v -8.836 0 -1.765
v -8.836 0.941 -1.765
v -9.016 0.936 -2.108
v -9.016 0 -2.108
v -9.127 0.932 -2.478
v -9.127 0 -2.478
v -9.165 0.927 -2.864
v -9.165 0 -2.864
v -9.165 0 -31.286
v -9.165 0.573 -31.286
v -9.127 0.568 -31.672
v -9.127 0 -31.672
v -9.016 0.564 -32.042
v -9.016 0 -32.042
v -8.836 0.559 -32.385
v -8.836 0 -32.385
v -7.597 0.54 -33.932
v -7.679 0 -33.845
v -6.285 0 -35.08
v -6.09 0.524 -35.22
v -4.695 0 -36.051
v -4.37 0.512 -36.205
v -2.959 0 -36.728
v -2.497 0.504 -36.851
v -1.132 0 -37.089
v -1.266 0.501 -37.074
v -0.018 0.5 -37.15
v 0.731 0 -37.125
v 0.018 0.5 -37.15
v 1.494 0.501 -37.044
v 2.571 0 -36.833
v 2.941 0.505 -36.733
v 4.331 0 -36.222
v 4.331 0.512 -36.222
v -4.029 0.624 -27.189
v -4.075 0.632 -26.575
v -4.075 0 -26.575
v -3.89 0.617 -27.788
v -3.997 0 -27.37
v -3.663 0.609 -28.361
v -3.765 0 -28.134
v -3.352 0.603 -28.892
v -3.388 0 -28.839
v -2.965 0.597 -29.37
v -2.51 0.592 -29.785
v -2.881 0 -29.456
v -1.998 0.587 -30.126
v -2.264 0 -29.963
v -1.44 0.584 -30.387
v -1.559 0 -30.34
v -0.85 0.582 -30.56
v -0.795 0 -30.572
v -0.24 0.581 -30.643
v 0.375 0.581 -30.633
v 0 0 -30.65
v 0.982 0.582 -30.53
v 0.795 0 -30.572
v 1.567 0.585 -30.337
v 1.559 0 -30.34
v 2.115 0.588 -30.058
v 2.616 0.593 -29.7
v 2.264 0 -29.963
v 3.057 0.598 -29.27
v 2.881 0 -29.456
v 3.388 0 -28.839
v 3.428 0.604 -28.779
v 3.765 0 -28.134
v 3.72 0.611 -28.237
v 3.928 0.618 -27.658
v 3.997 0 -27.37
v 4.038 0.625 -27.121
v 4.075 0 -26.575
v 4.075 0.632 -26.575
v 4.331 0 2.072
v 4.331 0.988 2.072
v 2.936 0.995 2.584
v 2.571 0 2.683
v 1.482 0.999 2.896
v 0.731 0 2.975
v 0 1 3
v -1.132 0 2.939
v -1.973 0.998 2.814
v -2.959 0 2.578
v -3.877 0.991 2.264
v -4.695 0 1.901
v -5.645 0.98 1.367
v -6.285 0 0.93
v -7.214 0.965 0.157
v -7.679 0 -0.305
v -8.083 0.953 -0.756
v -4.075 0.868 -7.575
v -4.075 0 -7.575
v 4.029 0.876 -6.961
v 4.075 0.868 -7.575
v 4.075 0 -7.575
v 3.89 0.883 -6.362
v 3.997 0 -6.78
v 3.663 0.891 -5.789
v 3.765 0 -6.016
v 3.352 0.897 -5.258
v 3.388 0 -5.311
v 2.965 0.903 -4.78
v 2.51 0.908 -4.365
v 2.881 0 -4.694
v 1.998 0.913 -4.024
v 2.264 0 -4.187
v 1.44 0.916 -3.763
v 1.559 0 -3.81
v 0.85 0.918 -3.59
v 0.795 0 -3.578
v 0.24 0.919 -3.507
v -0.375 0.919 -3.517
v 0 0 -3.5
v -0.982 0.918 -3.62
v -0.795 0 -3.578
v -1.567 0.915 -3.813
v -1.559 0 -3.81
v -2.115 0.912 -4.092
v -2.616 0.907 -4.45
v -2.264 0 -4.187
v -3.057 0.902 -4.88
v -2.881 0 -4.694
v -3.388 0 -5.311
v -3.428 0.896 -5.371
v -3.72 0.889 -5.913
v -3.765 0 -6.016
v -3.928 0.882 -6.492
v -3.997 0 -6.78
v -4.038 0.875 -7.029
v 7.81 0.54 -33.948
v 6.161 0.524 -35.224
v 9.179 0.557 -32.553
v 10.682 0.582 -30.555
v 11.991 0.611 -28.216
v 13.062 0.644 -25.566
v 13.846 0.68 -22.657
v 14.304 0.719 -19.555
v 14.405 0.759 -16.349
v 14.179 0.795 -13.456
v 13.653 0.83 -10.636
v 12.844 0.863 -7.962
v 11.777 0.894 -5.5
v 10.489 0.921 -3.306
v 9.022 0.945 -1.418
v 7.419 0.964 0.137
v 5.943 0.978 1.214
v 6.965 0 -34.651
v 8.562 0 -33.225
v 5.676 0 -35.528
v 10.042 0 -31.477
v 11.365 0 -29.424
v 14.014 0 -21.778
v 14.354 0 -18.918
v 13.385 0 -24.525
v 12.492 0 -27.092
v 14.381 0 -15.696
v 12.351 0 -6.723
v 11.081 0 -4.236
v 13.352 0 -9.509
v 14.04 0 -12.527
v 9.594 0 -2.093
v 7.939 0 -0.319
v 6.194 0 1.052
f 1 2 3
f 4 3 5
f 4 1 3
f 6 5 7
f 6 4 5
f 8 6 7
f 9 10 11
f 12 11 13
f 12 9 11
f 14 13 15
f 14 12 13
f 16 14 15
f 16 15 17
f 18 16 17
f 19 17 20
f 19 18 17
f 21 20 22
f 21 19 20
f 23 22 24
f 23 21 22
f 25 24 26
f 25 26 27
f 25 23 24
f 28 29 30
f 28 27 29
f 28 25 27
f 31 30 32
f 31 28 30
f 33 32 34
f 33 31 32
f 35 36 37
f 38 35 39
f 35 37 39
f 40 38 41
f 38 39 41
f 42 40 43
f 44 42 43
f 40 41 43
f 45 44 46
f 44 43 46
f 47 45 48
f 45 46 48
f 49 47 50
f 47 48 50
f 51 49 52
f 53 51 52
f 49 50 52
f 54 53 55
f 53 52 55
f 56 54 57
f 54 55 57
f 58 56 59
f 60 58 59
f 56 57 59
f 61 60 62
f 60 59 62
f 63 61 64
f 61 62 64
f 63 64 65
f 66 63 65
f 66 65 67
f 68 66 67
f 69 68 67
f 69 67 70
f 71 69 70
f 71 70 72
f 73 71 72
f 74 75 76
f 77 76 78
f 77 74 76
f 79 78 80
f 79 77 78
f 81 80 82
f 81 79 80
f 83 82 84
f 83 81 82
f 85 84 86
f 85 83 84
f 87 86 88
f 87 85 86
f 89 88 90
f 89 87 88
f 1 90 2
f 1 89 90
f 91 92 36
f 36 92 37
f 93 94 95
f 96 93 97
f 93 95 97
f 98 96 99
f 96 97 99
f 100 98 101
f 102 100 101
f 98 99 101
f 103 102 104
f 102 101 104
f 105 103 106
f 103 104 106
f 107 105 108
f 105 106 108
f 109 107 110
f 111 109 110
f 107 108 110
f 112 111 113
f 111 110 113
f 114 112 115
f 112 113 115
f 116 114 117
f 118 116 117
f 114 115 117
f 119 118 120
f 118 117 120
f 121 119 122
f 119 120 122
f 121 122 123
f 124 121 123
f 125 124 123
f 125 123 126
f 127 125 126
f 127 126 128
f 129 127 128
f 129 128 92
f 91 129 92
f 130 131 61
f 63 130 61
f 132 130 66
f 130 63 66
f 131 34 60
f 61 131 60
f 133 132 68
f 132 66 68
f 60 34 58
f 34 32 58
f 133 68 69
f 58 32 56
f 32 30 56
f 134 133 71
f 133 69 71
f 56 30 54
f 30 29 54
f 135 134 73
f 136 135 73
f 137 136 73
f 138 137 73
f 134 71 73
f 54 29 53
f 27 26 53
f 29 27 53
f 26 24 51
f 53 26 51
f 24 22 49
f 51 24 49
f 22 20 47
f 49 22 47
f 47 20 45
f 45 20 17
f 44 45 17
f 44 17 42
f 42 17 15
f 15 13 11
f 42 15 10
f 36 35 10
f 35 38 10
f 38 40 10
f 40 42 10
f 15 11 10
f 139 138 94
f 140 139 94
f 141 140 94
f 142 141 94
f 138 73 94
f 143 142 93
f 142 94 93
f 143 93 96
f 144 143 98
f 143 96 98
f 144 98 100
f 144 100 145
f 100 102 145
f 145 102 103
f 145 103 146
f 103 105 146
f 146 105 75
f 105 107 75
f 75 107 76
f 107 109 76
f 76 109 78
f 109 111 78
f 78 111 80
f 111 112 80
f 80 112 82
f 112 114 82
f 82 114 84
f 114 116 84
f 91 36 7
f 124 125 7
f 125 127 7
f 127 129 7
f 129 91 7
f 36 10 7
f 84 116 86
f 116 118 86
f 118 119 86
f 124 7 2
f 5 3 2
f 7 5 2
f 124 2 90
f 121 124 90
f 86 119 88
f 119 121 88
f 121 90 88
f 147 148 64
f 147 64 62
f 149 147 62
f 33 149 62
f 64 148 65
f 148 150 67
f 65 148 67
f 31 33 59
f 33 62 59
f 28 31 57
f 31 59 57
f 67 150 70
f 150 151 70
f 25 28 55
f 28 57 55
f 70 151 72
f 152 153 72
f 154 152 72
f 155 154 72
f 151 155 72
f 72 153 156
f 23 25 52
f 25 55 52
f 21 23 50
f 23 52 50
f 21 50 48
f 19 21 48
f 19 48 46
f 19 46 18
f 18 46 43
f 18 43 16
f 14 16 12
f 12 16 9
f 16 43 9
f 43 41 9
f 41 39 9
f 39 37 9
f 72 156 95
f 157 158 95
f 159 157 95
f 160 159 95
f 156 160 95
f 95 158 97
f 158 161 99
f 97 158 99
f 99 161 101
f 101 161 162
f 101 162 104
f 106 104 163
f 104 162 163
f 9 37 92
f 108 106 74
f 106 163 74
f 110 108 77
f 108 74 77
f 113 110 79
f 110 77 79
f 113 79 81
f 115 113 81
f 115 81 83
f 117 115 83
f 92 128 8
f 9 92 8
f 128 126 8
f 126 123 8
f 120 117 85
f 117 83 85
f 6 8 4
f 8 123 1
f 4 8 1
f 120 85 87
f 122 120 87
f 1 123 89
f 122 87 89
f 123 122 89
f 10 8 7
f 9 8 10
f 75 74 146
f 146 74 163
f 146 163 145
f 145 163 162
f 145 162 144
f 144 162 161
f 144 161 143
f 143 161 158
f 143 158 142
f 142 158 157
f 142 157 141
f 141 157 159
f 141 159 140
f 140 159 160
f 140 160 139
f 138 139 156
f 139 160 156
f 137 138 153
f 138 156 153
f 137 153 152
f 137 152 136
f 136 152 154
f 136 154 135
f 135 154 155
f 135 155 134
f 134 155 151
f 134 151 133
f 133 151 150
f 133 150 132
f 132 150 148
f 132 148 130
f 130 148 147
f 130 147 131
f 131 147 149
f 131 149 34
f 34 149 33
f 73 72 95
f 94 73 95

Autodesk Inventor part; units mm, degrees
ref_plane "YZ Plane" through (0, 0, 0) normal (1, 0, 0) x (0, 1, 0)
ref_plane "XZ Plane" through (0, 0, 0) normal (0, 1, 0) x (-1, 0, 0)
ref_plane "XY Plane" through (0, 0, 0) normal (0, 0, 1) x (1, 0, 0)
sketch "Sketch1" plane through (0, 0, 0) normal (0, 1, 0) x (-1, 0, 0)
  line L0 (0, 0) -> (0, -34.15) construction
  arc A0 (6.6649, -3.975) -> (-7.575, -7.575) centre (0, -7.575) ccw construction
  arc A1 (-7.575, -26.575) -> (6.6649, -30.175) centre (0, -26.575) ccw construction
  line L1 (4.075, -7.575) -> (4.075, -26.575) construction
  arc A2 (-4.075, -26.575) -> (4.075, -26.575) centre (0, -26.575) ccw construction
  line L2 (-4.075, -26.575) -> (-4.075, -7.575) construction
  arc A3 (4.075, -7.575) -> (-4.075, -7.575) centre (0, -7.575) ccw construction
  line L3 (9.1649, -3.975) -> (9.1649, -30.175) construction
  line L4 (9.1649, -3.975) -> (6.6649, -3.975) construction
  line L5 (9.1649, -30.175) -> (6.6649, -30.175) construction
  line L6 (-10.575, -14.075) -> (-10.575, -20.075) construction
  line L7 (0, -17.075) -> (-19.3792, -17.075) construction
  line L8 (-4.075, -20.075) -> (-4.075, -24.075) construction
  line L9 (-10.575, -20.075) -> (-7.575, -21.8932) construction
  line L10 (-10.575, -14.075) -> (-7.575, -12.2568) construction
  line L11 (-7.575, -7.575) -> (-7.575, -12.2568) construction
  line L12 (-7.575, -21.8932) -> (-7.575, -26.575) construction
  line L13 (-10.575, -17.075) -> (-16.875, -17.075) construction
  line L14 (-10.575, -14.075) -> (-14.875, -14.075) construction
  line L15 (-16.875, -16.075) -> (-16.875, -18.075) construction
  line L16 (-14.875, -20.075) -> (-10.575, -20.075) construction
  arc A4 (-14.875, -14.075) -> (-16.875, -16.075) centre (-14.875, -16.075) ccw construction
  arc A5 (-16.875, -18.075) -> (-14.875, -20.075) centre (-14.875, -18.075) ccw construction
  line L17 (-6.7059, -17.075) -> (-6.7059, -23.075) construction
  line L18 (-6.7059, -17.075) -> (-6.7059, -11.075) construction
  line L19 (-7.575, -11.075) -> (-14.875, -11.075) construction
  line L20 (-16.875, -13.075) -> (-16.875, -21.075) construction
  line L21 (-14.875, -23.075) -> (-7.575, -23.075) construction
  arc A6 (-14.875, -11.075) -> (-16.875, -13.075) centre (-14.875, -13.075) ccw construction
  arc A7 (-16.875, -21.075) -> (-14.875, -23.075) centre (-14.875, -21.075) ccw construction
  line L22 (19.3047, -16.075) -> (19.3047, -18.075) construction
  line L23 (17.3047, -14.075) -> (13.3047, -14.075) construction
  line L24 (17.3047, -20.075) -> (13.3047, -20.075) construction
  line L25 (9.1649, -16.075) -> (9.1649, -22.575) construction
  line L26 (9.1649, -17.075) -> (9.1649, -11.575) construction
  line L27 (9.1649, -11.575) -> (13.3047, -14.075) construction
  line L28 (9.1649, -22.575) -> (13.3047, -20.075) construction
  arc A8 (19.3047, -16.075) -> (17.3047, -14.075) centre (17.3047, -16.075) ccw construction
  arc A9 (17.3047, -20.075) -> (19.3047, -18.075) centre (17.3047, -18.075) ccw construction
  line L29 (9.1649, -30.175) -> (9.1649, -26.175) construction
  line L30 (9.1649, -3.975) -> (9.1649, -7.975) construction
  line L31 (9.1649, -24.9114) -> (13.8618, -22.075) construction
  line L32 (13.8618, -22.075) -> (17.3047, -22.075) construction
  arc A10 (17.3047, -22.075) -> (21.3047, -18.075) centre (17.3047, -18.075) ccw construction
  line L33 (21.3047, -18.075) -> (21.3047, -16.075) construction
  arc A11 (21.3047, -16.075) -> (17.3047, -12.075) centre (17.3047, -16.075) ccw construction
  line L34 (17.3047, -12.075) -> (13.8618, -12.075) construction
  line L35 (13.8618, -12.075) -> (9.1649, -9.2386) construction
  point P0 (7.575, -17.075)
  point P1 (-4.075, -10.075)
  point P2 (19.3047, -14.075)
  point P3 (19.3047, -20.075)
  dimension "d0" = 34.15
  dimension "d1" = 15.15
  dimension "d5" = 6
  dimension "d7" = 4
  dimension "d8" = 2.5
  dimension "d9" = 3.5
  dimension "d10" = 8.15
  dimension "d12" = 2
  dimension "d14" = 6
  dimension "d15" = 6
  dimension "d16" = 2
  dimension "d18" = 6
  dimension "d19" = 6
  dimension "d20" = 5.5
  dimension "d21" = 5.5
  dimension "d23" = 4
  dimension "d24" = 4
  dimension "d25" = 2
sketch "Sketch3" plane through (0, 0, 0) normal (0, 1, 0) x (-1, 0, 0)
  arc A0 (6.6649, -3.975) -> (-7.575, -7.575) centre (0, -7.575) ccw construction
  arc A1 (-7.575, -26.575) -> (6.6649, -30.175) centre (0, -26.575) ccw construction
  arc A2 (-4.075, -26.575) -> (4.075, -26.575) centre (0, -26.575) ccw projected
  line L0 (4.075, -7.575) -> (4.075, -26.575) projected
  arc A3 (4.075, -7.575) -> (-4.075, -7.575) centre (0, -7.575) ccw projected
  line L1 (-4.075, -26.575) -> (-4.075, -7.575) projected
  line L2 (9.1649, -3.975) -> (9.1649, -30.175) construction
  line L3 (-10.575, -14.075) -> (-10.575, -20.075) construction
  line L4 (-16.875, -16.075) -> (-16.875, -18.075) construction
  arc A4 (8.836, -1.765) -> (-4.3309, 2.0725) centre (0, -7.575) ccw
  arc A5 (-4.3309, -36.2225) -> (8.836, -32.385) centre (0, -26.575) ccw
  line L5 (9.1649, -2.8638) -> (9.1649, -31.2862)
  arc A6 (9.1649, -2.8638) -> (8.836, -1.765) centre (7.1649, -2.8638) ccw
  arc A7 (8.836, -32.385) -> (9.1649, -31.2862) centre (7.1649, -31.2862) ccw
  line L6 (-12.075, -10.8843) -> (-12.075, -24.6972)
  ellipse E0 centre (0, -17.075) end of major axis (0, -37.15) minor radius 14.4147 (-4.3309, 2.0725) -> (-4.3309, -36.2225) ccw
  point P0 (0, 0)
  point P1 (9.1649, -2.2991)
  point P2 (9.1649, -31.8509)
  dimension "d26" = 3
  dimension "d27" = 3
  dimension "d28" = 2
  dimension "d29" = 6.5
  dimension "d30" = 8
extrude "Extrusion1" add sketch "Sketch3" along normal blind 1
ref_plane "Work Plane1" through (0, 1, 3) normal (1, 0, 0) x (0, 0, -1)
sketch "Sketch7" plane through (0, 1, 3) normal (1, 0, 0) x (0, 0, -1)
  line L0 (40.15, 0) -> (40.15, -1) projected
  line L1 (40.15, -1) -> (33.65, -1) projected
  line L2 (33.65, -1) -> (33.65, 0) projected
  line L3 (33.65, 0) -> (40.15, 0) projected
  line L4 (0, -1) -> (0, 0) projected
  line L5 (0, 0) -> (6.5, 0) projected
  line L6 (6.5, 0) -> (6.5, -1) projected
  line L7 (6.5, -1) -> (0, -1) projected
  line L8 (40.15, -1) -> (35.385, -1) construction
  line L9 (40.15, -1) -> (40.15, -0.5) construction
  line L10 (40.15, -1) -> (40.15, 0) construction
  line L11 (4.765, 0) -> (0, 0) construction
  line L12 (40.15, -0.5) -> (0, 0)
  line L13 (0, 0) -> (40.15, 0)
  line L14 (40.15, 0) -> (40.15, -0.5)
  point P0 (3, -1)
  point P1 (39.2225, -1)
  point P2 (0.9275, 0)
extrude "Extrusion2" cut sketch "Sketch7" along normal blind 20 and the other way blind 20 contours L0 L12 L2 L3 | L2 L12 L6 L13 | L6 L12 L5
properties part number "SPD_MTB_cleat_new_1mm_05mm"
